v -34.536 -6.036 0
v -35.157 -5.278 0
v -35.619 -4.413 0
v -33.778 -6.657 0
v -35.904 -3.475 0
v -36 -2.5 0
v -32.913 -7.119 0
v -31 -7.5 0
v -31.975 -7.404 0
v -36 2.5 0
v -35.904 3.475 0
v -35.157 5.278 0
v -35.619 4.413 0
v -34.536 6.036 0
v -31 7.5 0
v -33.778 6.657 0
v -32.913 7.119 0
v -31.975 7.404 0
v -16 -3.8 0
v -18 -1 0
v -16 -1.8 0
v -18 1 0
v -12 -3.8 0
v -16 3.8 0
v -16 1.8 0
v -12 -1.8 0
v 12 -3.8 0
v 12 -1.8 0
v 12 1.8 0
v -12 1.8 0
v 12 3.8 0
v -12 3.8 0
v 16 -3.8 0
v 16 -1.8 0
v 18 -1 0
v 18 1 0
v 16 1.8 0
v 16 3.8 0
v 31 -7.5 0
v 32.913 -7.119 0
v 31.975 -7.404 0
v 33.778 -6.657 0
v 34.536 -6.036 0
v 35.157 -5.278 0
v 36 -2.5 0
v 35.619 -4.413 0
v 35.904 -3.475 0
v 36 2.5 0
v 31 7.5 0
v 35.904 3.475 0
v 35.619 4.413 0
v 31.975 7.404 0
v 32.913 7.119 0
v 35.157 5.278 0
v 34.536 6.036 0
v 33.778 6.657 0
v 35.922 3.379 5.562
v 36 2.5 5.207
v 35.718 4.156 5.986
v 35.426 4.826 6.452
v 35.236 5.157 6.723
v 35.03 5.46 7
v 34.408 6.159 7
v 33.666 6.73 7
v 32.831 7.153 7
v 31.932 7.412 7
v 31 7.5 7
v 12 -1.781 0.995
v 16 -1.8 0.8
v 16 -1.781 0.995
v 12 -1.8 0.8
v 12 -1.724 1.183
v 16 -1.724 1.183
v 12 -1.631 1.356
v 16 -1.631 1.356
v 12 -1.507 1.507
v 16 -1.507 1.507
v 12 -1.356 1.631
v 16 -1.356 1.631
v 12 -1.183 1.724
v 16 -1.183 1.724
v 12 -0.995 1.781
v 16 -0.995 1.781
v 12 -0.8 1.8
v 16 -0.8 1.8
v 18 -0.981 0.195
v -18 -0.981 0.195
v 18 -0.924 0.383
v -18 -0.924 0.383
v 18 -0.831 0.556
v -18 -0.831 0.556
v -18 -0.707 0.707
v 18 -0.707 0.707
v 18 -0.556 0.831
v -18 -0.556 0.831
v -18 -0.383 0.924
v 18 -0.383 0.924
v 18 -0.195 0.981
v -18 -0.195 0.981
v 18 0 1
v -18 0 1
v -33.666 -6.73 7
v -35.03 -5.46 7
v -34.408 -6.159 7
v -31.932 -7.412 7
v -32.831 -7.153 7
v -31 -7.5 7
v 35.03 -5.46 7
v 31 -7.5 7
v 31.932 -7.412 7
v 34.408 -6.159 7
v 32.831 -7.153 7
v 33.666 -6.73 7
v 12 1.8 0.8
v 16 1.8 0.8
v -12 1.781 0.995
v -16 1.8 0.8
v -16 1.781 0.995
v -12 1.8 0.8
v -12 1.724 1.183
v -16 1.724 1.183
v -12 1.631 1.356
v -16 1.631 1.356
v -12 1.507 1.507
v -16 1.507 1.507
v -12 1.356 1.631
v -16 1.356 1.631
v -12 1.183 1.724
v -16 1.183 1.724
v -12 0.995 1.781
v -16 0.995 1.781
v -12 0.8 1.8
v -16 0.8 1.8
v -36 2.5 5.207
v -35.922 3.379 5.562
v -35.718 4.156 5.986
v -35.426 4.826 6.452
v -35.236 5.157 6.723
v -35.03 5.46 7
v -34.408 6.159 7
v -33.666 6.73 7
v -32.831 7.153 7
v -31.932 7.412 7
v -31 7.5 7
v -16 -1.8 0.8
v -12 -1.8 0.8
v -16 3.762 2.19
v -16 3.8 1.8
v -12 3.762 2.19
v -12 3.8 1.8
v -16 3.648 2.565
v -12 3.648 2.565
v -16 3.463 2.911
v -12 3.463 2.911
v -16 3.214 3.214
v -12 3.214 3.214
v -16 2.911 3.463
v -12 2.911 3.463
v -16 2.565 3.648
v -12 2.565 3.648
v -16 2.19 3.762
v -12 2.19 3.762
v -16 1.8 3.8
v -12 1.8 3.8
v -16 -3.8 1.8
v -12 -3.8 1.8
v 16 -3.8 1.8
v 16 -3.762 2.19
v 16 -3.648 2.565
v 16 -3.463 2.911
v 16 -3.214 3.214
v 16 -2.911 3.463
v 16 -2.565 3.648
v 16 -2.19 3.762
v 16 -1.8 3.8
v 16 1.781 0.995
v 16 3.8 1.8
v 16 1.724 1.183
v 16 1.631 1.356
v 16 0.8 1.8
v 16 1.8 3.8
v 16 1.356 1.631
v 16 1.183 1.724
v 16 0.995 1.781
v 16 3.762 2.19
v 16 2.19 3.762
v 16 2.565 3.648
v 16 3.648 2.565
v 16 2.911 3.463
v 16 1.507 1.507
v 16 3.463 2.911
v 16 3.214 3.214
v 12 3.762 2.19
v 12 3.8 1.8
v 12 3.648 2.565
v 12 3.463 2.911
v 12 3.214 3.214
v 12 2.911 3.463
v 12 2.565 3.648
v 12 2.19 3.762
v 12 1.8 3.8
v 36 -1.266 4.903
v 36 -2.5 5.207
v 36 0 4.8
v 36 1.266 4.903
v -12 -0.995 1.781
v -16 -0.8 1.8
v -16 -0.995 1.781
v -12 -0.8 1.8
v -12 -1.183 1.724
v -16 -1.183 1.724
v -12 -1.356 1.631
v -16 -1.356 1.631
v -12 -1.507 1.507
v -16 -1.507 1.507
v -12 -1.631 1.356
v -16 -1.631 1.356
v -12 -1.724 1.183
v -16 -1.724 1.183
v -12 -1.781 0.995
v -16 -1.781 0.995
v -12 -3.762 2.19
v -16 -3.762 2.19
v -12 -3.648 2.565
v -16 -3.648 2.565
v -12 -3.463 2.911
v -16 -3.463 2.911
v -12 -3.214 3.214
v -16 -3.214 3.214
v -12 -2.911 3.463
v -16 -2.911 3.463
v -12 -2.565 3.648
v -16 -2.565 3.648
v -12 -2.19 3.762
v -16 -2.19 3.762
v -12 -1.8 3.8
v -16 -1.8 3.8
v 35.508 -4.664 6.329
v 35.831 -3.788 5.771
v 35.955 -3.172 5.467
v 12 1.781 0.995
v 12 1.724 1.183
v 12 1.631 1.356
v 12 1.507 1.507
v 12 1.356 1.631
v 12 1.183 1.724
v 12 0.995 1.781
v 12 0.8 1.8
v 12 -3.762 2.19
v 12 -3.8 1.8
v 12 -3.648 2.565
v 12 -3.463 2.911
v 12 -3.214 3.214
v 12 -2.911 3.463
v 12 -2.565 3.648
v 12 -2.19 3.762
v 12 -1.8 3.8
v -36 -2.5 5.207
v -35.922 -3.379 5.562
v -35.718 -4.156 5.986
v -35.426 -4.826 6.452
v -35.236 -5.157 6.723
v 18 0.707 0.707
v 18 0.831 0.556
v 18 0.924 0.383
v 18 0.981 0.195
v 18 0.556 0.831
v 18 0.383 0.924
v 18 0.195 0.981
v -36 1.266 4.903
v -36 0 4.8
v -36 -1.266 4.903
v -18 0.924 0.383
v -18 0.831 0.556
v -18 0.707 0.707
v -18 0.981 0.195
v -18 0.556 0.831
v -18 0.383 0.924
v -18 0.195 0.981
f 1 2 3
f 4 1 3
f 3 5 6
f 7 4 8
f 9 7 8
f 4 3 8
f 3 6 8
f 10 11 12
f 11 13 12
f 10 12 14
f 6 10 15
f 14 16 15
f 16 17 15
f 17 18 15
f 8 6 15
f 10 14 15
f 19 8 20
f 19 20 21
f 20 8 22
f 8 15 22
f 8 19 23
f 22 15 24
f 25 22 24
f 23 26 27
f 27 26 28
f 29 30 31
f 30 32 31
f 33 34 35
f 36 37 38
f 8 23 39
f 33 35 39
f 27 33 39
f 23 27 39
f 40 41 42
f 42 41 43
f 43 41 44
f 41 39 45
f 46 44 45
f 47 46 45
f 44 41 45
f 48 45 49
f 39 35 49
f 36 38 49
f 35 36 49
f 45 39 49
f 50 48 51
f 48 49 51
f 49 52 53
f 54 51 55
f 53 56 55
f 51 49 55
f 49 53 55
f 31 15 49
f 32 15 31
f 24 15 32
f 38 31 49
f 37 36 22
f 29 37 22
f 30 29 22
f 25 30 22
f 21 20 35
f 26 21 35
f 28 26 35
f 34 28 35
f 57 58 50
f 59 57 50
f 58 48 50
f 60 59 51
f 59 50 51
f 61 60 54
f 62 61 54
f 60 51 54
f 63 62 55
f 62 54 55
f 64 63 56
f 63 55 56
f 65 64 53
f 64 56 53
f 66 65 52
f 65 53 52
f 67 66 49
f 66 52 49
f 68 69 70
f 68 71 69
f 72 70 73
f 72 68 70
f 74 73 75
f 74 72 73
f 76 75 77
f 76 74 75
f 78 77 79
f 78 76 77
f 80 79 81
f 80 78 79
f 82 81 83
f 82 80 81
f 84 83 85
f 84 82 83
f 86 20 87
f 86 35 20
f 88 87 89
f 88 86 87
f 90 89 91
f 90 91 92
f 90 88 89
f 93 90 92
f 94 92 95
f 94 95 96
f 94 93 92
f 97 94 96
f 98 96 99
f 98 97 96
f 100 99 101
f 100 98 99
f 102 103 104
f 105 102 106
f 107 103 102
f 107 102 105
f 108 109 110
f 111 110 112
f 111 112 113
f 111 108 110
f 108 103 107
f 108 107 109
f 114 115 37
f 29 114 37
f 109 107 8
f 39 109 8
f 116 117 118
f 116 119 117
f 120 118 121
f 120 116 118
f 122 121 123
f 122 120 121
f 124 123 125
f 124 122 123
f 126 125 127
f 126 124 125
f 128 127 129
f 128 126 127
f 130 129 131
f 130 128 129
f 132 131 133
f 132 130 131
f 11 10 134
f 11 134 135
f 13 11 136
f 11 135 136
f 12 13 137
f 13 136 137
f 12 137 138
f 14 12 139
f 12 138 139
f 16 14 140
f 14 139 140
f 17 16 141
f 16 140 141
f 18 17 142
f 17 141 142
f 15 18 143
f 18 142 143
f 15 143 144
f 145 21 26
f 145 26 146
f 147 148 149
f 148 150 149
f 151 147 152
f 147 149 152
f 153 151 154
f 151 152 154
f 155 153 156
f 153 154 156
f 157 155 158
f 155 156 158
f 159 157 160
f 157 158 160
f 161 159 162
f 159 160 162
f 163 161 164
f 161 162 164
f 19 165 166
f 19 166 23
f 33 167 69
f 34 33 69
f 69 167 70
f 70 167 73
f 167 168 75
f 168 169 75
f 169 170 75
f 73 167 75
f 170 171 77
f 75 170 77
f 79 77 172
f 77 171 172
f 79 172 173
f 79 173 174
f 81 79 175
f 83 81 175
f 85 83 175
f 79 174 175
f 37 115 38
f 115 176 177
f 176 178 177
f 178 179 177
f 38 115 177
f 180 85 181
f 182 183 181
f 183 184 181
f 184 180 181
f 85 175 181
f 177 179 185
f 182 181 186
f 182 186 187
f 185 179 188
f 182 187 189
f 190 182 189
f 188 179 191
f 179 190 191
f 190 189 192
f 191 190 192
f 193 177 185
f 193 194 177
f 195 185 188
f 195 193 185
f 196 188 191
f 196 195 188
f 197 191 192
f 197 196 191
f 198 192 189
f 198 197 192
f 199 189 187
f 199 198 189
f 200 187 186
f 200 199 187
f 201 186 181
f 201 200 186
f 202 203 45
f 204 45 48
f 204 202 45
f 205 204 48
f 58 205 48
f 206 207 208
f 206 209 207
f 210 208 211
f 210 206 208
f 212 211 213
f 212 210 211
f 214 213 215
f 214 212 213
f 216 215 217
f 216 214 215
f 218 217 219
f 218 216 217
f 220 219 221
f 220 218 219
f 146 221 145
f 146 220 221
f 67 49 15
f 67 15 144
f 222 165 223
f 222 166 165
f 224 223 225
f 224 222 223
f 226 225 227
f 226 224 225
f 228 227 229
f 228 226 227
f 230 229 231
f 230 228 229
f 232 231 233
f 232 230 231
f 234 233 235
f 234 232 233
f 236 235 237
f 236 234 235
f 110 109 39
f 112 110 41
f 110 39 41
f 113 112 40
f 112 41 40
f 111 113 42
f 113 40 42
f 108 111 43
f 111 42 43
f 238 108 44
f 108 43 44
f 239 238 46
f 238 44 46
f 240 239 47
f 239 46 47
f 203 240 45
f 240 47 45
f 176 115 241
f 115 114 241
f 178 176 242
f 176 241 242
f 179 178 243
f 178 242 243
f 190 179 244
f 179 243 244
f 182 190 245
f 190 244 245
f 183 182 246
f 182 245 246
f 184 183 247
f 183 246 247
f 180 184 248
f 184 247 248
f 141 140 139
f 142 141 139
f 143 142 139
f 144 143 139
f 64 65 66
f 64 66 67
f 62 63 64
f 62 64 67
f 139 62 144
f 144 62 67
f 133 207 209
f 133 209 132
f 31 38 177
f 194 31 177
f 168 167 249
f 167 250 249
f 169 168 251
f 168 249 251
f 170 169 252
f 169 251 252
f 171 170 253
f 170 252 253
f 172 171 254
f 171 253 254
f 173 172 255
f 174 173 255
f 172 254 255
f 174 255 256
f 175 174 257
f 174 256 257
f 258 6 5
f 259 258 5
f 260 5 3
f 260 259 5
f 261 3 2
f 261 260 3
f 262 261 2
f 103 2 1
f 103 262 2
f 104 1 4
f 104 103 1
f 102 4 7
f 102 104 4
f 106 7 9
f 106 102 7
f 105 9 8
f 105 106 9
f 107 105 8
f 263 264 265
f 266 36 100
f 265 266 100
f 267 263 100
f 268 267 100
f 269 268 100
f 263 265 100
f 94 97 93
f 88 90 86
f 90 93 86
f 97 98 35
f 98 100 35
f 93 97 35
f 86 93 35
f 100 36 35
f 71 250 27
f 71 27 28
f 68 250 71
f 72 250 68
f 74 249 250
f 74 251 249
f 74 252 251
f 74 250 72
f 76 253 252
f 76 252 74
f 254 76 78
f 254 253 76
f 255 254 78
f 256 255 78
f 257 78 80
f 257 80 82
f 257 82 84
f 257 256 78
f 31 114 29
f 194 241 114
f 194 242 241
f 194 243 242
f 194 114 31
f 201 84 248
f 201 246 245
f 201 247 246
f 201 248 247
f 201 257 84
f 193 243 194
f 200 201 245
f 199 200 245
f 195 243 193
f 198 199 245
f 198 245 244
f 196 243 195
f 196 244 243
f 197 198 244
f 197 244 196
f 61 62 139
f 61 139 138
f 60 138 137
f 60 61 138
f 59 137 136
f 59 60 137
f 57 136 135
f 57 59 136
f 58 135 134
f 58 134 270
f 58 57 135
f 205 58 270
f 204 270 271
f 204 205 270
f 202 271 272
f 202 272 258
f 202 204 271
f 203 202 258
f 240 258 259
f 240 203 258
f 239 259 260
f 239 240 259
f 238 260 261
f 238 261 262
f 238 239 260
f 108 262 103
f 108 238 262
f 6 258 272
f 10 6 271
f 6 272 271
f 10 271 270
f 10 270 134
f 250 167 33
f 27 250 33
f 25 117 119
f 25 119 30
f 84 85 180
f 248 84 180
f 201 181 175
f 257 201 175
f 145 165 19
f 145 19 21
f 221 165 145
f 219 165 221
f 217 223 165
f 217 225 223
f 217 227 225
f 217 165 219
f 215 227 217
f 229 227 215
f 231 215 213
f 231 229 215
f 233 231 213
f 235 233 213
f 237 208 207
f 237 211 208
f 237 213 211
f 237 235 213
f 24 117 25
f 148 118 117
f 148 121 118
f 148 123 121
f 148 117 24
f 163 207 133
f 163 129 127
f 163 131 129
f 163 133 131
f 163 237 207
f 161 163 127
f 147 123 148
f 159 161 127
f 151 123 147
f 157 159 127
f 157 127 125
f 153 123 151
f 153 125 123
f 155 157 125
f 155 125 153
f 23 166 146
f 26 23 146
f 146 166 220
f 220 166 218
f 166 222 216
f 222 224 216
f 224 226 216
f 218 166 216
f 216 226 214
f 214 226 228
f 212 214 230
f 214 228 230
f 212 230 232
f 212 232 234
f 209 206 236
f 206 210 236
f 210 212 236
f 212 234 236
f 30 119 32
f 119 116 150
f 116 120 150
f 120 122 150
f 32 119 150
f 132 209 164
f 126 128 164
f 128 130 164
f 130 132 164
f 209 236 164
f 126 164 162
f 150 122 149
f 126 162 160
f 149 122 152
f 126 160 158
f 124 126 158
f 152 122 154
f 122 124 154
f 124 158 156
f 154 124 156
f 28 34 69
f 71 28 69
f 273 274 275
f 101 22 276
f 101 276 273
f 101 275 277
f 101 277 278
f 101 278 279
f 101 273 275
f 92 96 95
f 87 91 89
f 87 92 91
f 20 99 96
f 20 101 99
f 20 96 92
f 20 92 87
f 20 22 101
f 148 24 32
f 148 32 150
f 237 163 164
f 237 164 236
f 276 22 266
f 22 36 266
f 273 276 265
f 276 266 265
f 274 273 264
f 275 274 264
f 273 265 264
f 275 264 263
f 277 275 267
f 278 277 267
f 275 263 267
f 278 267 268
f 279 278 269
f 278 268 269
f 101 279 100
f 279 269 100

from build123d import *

# Parameters (mm, degrees)
F0_W      = 72
F0_H      = 15
F1_DEPTH  = 3.8
F3_DEPTH  = 72
F4_R      = 5
F5_W      = 36
F5_H      = 2
F6_DEPTH  = 1
F7_R      = 0.99999
F10_DEPTH = 4
F11_R     = 2
F12_R     = 1


# Not quite as in the source:
# - a fillet or chamfer is up to 0.001 mm smaller than in the source, because OpenCascade refuses the exact size
# - a pattern or mirror of a feature is missing from the dataset's text; its kind, count and spacing are read off the source's solid


with BuildPart() as f1:
    # F0 (on Top) → F1 (new body)
    with BuildSketch(Plane.XY):
        Rectangle(F0_W, F0_H)
    extrude(amount=F1_DEPTH)

    # F2 (on face) → F3 (join)
    with BuildSketch(Plane.YZ.offset(36)):
        with BuildLine():
            Line((7.5, 7), (5.4598534779, 7))
            ThreePointArc((5.4598534779, 7), (0, 4.8), (-5.4598534779, 7))
            Line((-5.4598534779, 7), (-7.5, 7))
            Line((-7.5, 7), (-7.5, 3.8))
            Line((-7.5, 3.8), (7.5, 3.8))
            Line((7.5, 3.8), (7.5, 7))
        make_face()
    extrude(amount=-F3_DEPTH)

    # F4
    f4_edges = [f1.edges().sort_by_distance(p)[0] for p in [
        (-36, -7.5, 3.5),
        (36, -7.5, 3.5),
        (36, 7.5, 3.5),
        (-36, 7.5, 3.5),
    ]]
    fillet(f4_edges, radius=F4_R)

    # F5 (on face) → F6 (cut)
    with BuildSketch(Plane(origin=(0, 0, 0), x_dir=(1, 0, 0), z_dir=(0, 0, -1))):
        Rectangle(F5_W, F5_H)
    extrude(amount=-F6_DEPTH, mode=Mode.SUBTRACT)

    # F7 (radius 1 in the source; OpenCascade refuses exactly that, so slightly less here)
    f7_edges = [f1.edges().sort_by_distance(p)[0] for p in [
        (0, -1, 1),
        (0, 1, 1),
    ]]
    fillet(f7_edges, radius=F7_R)

    # F9 (on offset) → F10 (cut)
    with BuildSketch(Plane.YZ.offset(16)):
        Polygon((-3.8, 0), (-1.8, 0), (-1.8, 1.8), (0, 1.8), (1.8, 1.8), (1.8, 0), (3.8, 0), (3.8, 3.8), (0, 3.8), (-3.8, 3.8), align=None)
    f10 = extrude(amount=-F10_DEPTH, mode=Mode.SUBTRACT)

    # F10_copies: F10 across plane
    add(f10.mirror(Plane(origin=(0, 0, 0), x_dir=(0, 0, -1), z_dir=(-1, 0, 0))), mode=Mode.SUBTRACT)

    # F11
    f11_edges = [f1.edges().sort_by_distance(p)[0] for p in [
        (14, -3.8, 3.8),
        (14, 3.8, 3.8),
        (-14, -3.8, 3.8),
        (-14, 3.8, 3.8),
    ]]
    fillet(f11_edges, radius=F11_R)

    # F12
    f12_edges = [f1.edges().sort_by_distance(p)[0] for p in [
        (14, -1.8, 1.8),
        (14, 1.8, 1.8),
        (-14, 1.8, 1.8),
        (-14, -1.8, 1.8),
    ]]
    fillet(f12_edges, radius=F12_R)


solid = f1.part
